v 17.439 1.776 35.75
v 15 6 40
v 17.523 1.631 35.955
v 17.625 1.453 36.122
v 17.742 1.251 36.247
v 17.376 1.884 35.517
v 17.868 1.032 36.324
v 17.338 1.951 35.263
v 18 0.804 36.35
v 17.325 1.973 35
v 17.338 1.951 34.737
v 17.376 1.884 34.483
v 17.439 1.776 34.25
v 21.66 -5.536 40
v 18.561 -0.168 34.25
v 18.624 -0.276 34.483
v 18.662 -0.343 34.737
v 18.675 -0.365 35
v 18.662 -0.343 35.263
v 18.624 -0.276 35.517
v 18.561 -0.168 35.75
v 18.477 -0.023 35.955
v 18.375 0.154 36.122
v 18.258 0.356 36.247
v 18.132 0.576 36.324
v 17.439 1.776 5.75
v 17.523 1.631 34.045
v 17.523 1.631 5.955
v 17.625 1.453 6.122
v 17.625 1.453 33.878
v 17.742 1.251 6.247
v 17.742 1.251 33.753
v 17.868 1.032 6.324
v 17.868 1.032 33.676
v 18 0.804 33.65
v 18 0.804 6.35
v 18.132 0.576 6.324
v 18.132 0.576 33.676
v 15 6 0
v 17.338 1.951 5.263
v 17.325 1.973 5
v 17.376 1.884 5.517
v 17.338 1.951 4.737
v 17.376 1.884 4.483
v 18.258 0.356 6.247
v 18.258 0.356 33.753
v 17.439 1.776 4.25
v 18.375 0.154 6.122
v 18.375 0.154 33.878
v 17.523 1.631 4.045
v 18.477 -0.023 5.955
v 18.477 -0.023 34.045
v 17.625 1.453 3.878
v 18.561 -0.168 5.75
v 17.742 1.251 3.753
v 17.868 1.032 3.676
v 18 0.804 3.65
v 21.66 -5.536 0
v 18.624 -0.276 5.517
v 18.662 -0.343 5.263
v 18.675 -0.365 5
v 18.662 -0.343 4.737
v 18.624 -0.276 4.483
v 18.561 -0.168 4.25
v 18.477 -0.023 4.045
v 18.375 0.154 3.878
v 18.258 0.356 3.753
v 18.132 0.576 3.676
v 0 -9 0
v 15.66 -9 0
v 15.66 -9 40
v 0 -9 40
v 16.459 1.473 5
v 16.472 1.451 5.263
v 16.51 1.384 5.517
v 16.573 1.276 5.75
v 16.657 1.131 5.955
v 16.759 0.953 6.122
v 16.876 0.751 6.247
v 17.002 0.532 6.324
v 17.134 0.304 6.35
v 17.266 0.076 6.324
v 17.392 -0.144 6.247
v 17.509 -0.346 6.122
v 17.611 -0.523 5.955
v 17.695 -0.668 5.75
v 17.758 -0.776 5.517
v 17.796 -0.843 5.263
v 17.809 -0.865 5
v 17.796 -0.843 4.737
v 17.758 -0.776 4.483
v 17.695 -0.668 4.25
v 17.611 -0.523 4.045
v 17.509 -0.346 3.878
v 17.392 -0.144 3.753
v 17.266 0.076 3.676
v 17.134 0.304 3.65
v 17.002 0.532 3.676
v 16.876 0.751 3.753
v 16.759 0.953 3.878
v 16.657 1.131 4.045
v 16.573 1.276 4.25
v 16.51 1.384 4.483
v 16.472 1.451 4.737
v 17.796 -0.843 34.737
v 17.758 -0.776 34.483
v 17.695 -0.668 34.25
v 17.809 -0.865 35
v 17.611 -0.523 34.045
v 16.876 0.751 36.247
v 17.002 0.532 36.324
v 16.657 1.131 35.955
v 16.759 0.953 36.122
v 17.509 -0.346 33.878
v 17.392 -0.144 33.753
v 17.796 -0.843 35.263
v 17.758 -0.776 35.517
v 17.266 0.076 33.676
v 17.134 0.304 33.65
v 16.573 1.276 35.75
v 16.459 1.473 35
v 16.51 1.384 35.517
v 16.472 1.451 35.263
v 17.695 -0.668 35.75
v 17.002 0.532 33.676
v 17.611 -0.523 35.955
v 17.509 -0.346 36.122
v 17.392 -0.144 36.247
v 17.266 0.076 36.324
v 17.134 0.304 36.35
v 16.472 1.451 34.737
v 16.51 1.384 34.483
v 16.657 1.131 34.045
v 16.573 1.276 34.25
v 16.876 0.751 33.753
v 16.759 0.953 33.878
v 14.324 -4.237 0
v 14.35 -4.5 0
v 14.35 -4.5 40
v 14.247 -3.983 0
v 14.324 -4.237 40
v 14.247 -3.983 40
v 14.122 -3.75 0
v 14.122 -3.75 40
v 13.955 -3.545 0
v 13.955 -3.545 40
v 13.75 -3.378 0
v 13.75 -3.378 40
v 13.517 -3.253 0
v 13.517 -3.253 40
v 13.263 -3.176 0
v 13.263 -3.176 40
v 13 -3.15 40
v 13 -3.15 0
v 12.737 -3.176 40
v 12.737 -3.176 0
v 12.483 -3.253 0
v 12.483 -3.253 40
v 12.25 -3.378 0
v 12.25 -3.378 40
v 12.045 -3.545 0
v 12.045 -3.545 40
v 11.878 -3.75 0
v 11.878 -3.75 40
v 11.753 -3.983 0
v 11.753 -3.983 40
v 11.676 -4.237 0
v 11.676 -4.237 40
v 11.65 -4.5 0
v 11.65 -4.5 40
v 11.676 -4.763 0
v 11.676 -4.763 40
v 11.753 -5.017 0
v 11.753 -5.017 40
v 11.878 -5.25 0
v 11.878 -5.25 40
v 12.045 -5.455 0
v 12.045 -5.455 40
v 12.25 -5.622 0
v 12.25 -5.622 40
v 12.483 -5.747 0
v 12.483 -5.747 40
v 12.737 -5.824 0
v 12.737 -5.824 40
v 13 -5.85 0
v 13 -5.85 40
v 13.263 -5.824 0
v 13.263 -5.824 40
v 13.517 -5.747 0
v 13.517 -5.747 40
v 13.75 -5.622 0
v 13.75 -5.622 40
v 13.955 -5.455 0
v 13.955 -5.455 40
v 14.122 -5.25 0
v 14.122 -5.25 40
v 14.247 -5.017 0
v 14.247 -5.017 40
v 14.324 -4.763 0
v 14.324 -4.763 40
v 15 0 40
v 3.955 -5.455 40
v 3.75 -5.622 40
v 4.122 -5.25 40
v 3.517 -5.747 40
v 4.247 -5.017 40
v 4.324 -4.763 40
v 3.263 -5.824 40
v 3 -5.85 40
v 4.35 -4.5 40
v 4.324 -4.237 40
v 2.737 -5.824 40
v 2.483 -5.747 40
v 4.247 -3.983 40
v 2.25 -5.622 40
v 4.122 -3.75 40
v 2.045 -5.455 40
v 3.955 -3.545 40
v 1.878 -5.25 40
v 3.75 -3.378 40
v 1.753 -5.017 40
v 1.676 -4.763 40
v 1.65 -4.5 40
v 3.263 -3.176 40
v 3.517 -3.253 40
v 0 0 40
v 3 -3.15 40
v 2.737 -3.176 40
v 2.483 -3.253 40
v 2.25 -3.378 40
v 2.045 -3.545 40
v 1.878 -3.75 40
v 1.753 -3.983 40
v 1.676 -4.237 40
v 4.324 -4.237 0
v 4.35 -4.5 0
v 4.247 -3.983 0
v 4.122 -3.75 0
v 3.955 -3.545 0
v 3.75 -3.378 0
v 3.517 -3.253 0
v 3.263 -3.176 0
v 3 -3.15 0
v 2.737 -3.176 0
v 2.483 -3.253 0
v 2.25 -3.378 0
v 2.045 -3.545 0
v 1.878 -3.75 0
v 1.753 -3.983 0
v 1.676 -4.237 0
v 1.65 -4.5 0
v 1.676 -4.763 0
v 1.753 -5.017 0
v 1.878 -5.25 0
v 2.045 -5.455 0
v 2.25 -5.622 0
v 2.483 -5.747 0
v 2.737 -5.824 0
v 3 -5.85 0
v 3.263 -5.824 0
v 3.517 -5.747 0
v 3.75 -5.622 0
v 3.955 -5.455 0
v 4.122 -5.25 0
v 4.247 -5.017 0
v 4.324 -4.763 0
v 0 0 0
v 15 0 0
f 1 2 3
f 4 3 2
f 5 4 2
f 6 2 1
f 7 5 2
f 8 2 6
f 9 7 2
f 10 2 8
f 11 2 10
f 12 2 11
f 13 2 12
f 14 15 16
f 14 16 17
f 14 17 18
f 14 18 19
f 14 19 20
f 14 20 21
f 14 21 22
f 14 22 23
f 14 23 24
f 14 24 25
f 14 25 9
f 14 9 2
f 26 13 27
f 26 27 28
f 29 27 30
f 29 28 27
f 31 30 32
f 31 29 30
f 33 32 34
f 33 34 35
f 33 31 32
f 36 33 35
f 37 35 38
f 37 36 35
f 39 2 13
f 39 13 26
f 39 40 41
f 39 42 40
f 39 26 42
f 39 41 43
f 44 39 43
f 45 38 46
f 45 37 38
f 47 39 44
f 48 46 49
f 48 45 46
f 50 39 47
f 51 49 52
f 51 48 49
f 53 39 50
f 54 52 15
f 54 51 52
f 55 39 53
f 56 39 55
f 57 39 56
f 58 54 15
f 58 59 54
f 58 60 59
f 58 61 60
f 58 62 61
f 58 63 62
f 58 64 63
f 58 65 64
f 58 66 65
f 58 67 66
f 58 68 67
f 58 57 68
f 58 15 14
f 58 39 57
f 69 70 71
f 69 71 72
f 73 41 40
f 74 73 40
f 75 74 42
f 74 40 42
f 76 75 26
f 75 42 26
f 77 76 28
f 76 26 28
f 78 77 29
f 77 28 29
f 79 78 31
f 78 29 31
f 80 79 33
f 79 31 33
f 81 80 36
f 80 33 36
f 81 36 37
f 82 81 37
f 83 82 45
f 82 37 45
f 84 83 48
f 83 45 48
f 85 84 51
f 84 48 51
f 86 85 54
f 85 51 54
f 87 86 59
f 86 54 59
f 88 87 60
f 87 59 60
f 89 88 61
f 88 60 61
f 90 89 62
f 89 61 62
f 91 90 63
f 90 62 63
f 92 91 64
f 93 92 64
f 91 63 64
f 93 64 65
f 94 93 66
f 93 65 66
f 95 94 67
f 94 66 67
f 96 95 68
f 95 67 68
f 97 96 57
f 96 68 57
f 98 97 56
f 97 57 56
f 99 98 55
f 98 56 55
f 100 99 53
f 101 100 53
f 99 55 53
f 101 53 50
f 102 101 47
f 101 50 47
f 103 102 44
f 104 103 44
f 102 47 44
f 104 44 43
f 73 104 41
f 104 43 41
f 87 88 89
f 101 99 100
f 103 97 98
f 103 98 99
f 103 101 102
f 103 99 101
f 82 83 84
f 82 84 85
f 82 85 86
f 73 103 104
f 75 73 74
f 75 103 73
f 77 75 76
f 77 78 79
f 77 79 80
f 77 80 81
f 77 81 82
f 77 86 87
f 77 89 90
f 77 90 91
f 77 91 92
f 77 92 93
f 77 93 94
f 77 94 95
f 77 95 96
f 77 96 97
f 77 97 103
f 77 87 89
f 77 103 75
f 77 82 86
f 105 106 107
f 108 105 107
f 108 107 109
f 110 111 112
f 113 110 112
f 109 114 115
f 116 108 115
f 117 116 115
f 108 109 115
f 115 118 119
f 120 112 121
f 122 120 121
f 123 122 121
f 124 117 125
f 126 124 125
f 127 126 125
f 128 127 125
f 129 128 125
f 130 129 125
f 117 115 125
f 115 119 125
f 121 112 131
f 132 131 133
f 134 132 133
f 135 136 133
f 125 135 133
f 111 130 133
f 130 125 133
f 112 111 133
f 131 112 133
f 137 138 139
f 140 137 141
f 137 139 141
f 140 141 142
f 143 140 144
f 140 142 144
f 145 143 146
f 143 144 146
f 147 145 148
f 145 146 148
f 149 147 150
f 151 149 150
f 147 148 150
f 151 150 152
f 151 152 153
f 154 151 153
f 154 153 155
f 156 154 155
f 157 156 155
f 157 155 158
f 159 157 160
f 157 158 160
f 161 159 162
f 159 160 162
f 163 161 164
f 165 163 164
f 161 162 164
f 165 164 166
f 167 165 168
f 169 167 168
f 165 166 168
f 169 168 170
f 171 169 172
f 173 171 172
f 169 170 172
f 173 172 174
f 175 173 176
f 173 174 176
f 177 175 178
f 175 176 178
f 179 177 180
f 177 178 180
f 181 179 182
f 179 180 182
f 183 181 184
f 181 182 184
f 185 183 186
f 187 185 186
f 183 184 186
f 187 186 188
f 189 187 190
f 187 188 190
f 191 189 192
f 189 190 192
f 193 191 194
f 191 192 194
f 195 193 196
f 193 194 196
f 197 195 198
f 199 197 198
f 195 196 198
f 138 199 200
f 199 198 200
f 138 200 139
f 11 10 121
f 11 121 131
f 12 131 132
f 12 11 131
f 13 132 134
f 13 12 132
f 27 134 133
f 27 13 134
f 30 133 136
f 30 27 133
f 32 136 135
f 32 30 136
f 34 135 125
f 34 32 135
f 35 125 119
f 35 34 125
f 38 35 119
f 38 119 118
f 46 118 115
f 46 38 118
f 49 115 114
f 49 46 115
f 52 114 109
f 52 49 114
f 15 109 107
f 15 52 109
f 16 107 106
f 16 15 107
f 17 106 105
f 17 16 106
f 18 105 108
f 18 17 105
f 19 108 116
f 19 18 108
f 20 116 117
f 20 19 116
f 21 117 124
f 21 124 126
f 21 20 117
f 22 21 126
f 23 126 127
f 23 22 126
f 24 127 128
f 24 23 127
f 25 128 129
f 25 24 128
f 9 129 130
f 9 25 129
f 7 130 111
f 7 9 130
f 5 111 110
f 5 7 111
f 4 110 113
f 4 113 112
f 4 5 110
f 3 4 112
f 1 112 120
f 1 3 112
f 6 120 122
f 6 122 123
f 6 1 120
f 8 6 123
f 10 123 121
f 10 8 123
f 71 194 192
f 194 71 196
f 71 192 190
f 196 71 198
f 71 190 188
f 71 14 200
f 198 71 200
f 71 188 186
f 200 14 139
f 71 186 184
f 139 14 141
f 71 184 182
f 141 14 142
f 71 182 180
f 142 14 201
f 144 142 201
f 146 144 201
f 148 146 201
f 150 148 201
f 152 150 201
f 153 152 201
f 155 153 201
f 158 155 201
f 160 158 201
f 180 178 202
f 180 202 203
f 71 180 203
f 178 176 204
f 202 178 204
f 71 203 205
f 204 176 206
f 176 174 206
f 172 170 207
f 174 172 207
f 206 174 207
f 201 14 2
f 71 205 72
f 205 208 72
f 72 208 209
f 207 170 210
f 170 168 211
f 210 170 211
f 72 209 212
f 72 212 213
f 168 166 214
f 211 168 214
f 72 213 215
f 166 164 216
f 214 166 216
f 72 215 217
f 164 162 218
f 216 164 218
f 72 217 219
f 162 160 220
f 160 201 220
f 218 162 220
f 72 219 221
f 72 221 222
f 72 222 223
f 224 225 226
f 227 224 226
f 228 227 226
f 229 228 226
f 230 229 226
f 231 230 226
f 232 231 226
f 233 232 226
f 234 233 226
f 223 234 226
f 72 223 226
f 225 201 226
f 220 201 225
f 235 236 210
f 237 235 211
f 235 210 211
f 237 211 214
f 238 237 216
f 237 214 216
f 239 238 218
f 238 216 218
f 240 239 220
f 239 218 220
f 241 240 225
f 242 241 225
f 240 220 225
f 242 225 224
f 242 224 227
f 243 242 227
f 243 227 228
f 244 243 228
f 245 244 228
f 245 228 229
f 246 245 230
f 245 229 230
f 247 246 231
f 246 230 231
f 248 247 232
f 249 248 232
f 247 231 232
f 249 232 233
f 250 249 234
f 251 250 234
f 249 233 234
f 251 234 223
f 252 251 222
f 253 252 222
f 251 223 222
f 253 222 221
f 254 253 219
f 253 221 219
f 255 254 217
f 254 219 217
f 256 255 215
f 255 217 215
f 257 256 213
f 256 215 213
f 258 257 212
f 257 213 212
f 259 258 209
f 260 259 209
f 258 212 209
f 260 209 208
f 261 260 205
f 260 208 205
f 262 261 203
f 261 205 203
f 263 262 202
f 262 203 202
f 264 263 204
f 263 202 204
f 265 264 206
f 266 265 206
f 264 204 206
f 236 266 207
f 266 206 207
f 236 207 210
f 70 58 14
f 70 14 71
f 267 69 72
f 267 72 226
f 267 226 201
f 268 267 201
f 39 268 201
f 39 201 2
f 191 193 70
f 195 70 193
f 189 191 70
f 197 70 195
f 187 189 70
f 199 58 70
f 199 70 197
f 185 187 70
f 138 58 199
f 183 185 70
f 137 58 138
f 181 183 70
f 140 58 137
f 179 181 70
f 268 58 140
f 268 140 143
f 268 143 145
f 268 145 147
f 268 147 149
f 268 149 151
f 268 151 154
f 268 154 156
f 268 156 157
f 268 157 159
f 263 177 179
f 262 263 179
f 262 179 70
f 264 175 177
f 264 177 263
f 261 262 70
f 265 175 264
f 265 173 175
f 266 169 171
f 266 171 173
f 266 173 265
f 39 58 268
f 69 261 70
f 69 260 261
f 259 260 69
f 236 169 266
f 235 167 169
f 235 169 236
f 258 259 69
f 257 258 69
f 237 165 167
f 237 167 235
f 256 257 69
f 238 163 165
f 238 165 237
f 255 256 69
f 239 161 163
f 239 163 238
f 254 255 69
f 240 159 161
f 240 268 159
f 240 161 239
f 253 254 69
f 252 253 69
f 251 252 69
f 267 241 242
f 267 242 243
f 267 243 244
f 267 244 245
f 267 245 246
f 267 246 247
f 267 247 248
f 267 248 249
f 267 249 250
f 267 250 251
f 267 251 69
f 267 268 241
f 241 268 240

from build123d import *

# Parameters (mm, degrees)
EXTRUDE_1_DEPTH     = 40
SKETCH_2_R          = 1.35
CUT_EXTRUDE_1_DEPTH = 1
SKETCH_3_R          = 1.35
CUT_EXTRUDE_2_DEPTH = 40


with BuildPart() as part:
    # 草图1 → 凸台-拉伸1 (new body)
    with BuildSketch(Plane.XY):
        Polygon((0, 0), (15, 0), (15, 6), (21.660254038, -5.535898385), (15.660254038, -9), (0, -9), align=None)
    extrude(amount=EXTRUDE_1_DEPTH)

    # 草图2 → 切除-拉伸1 (cut)
    with BuildSketch(Plane(origin=(13.848076211, 7.995190528, 0), x_dir=(0, 0, -1), z_dir=(0.8660254037844386, 0.4999999999999999, 0))):
        with Locations(Location((-5, -8.30384758, 0), (0, 0, 90))):
            Circle(SKETCH_2_R)
    cut_extrude_1 = extrude(amount=-CUT_EXTRUDE_1_DEPTH, mode=Mode.SUBTRACT)

    # 镜向1: 切除-拉伸1 across plane
    add(cut_extrude_1.mirror(Plane.XY.offset(20)), mode=Mode.SUBTRACT)

    # 草图3 → 切除-拉伸2 (cut)
    with BuildSketch(Plane.XY.offset(40)):
        with Locations((3, -4.5)):
            Circle(SKETCH_3_R)
        with Locations((13, -4.5)):
            Circle(SKETCH_3_R)
    extrude(amount=-CUT_EXTRUDE_2_DEPTH, mode=Mode.SUBTRACT)


solid = part.part
